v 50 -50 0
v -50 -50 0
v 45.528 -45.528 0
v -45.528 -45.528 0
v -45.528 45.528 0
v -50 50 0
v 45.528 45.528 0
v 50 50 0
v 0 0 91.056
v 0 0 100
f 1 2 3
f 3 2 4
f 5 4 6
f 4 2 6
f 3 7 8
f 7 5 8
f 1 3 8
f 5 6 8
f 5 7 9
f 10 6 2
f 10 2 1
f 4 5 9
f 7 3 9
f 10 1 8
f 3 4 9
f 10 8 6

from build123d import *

# Parameters (mm, degrees)
F0_W = 100
F0_H = 100
F4_T = -4


with BuildPart() as f3:
    # F0 (on Top) → F3 section 0
    with BuildSketch(Plane.XY, mode=Mode.PRIVATE) as f3_s0:
        Rectangle(F0_W, F0_H)
    loft([f3_s0.sketch, Vertex(0, 0, 100)])

    # F4
    f4_openings = [f3.faces().sort_by_distance(p)[0] for p in [
        (0, 0, 0),
    ]]
    offset(amount=F4_T, openings=f4_openings)


solid = f3.part
